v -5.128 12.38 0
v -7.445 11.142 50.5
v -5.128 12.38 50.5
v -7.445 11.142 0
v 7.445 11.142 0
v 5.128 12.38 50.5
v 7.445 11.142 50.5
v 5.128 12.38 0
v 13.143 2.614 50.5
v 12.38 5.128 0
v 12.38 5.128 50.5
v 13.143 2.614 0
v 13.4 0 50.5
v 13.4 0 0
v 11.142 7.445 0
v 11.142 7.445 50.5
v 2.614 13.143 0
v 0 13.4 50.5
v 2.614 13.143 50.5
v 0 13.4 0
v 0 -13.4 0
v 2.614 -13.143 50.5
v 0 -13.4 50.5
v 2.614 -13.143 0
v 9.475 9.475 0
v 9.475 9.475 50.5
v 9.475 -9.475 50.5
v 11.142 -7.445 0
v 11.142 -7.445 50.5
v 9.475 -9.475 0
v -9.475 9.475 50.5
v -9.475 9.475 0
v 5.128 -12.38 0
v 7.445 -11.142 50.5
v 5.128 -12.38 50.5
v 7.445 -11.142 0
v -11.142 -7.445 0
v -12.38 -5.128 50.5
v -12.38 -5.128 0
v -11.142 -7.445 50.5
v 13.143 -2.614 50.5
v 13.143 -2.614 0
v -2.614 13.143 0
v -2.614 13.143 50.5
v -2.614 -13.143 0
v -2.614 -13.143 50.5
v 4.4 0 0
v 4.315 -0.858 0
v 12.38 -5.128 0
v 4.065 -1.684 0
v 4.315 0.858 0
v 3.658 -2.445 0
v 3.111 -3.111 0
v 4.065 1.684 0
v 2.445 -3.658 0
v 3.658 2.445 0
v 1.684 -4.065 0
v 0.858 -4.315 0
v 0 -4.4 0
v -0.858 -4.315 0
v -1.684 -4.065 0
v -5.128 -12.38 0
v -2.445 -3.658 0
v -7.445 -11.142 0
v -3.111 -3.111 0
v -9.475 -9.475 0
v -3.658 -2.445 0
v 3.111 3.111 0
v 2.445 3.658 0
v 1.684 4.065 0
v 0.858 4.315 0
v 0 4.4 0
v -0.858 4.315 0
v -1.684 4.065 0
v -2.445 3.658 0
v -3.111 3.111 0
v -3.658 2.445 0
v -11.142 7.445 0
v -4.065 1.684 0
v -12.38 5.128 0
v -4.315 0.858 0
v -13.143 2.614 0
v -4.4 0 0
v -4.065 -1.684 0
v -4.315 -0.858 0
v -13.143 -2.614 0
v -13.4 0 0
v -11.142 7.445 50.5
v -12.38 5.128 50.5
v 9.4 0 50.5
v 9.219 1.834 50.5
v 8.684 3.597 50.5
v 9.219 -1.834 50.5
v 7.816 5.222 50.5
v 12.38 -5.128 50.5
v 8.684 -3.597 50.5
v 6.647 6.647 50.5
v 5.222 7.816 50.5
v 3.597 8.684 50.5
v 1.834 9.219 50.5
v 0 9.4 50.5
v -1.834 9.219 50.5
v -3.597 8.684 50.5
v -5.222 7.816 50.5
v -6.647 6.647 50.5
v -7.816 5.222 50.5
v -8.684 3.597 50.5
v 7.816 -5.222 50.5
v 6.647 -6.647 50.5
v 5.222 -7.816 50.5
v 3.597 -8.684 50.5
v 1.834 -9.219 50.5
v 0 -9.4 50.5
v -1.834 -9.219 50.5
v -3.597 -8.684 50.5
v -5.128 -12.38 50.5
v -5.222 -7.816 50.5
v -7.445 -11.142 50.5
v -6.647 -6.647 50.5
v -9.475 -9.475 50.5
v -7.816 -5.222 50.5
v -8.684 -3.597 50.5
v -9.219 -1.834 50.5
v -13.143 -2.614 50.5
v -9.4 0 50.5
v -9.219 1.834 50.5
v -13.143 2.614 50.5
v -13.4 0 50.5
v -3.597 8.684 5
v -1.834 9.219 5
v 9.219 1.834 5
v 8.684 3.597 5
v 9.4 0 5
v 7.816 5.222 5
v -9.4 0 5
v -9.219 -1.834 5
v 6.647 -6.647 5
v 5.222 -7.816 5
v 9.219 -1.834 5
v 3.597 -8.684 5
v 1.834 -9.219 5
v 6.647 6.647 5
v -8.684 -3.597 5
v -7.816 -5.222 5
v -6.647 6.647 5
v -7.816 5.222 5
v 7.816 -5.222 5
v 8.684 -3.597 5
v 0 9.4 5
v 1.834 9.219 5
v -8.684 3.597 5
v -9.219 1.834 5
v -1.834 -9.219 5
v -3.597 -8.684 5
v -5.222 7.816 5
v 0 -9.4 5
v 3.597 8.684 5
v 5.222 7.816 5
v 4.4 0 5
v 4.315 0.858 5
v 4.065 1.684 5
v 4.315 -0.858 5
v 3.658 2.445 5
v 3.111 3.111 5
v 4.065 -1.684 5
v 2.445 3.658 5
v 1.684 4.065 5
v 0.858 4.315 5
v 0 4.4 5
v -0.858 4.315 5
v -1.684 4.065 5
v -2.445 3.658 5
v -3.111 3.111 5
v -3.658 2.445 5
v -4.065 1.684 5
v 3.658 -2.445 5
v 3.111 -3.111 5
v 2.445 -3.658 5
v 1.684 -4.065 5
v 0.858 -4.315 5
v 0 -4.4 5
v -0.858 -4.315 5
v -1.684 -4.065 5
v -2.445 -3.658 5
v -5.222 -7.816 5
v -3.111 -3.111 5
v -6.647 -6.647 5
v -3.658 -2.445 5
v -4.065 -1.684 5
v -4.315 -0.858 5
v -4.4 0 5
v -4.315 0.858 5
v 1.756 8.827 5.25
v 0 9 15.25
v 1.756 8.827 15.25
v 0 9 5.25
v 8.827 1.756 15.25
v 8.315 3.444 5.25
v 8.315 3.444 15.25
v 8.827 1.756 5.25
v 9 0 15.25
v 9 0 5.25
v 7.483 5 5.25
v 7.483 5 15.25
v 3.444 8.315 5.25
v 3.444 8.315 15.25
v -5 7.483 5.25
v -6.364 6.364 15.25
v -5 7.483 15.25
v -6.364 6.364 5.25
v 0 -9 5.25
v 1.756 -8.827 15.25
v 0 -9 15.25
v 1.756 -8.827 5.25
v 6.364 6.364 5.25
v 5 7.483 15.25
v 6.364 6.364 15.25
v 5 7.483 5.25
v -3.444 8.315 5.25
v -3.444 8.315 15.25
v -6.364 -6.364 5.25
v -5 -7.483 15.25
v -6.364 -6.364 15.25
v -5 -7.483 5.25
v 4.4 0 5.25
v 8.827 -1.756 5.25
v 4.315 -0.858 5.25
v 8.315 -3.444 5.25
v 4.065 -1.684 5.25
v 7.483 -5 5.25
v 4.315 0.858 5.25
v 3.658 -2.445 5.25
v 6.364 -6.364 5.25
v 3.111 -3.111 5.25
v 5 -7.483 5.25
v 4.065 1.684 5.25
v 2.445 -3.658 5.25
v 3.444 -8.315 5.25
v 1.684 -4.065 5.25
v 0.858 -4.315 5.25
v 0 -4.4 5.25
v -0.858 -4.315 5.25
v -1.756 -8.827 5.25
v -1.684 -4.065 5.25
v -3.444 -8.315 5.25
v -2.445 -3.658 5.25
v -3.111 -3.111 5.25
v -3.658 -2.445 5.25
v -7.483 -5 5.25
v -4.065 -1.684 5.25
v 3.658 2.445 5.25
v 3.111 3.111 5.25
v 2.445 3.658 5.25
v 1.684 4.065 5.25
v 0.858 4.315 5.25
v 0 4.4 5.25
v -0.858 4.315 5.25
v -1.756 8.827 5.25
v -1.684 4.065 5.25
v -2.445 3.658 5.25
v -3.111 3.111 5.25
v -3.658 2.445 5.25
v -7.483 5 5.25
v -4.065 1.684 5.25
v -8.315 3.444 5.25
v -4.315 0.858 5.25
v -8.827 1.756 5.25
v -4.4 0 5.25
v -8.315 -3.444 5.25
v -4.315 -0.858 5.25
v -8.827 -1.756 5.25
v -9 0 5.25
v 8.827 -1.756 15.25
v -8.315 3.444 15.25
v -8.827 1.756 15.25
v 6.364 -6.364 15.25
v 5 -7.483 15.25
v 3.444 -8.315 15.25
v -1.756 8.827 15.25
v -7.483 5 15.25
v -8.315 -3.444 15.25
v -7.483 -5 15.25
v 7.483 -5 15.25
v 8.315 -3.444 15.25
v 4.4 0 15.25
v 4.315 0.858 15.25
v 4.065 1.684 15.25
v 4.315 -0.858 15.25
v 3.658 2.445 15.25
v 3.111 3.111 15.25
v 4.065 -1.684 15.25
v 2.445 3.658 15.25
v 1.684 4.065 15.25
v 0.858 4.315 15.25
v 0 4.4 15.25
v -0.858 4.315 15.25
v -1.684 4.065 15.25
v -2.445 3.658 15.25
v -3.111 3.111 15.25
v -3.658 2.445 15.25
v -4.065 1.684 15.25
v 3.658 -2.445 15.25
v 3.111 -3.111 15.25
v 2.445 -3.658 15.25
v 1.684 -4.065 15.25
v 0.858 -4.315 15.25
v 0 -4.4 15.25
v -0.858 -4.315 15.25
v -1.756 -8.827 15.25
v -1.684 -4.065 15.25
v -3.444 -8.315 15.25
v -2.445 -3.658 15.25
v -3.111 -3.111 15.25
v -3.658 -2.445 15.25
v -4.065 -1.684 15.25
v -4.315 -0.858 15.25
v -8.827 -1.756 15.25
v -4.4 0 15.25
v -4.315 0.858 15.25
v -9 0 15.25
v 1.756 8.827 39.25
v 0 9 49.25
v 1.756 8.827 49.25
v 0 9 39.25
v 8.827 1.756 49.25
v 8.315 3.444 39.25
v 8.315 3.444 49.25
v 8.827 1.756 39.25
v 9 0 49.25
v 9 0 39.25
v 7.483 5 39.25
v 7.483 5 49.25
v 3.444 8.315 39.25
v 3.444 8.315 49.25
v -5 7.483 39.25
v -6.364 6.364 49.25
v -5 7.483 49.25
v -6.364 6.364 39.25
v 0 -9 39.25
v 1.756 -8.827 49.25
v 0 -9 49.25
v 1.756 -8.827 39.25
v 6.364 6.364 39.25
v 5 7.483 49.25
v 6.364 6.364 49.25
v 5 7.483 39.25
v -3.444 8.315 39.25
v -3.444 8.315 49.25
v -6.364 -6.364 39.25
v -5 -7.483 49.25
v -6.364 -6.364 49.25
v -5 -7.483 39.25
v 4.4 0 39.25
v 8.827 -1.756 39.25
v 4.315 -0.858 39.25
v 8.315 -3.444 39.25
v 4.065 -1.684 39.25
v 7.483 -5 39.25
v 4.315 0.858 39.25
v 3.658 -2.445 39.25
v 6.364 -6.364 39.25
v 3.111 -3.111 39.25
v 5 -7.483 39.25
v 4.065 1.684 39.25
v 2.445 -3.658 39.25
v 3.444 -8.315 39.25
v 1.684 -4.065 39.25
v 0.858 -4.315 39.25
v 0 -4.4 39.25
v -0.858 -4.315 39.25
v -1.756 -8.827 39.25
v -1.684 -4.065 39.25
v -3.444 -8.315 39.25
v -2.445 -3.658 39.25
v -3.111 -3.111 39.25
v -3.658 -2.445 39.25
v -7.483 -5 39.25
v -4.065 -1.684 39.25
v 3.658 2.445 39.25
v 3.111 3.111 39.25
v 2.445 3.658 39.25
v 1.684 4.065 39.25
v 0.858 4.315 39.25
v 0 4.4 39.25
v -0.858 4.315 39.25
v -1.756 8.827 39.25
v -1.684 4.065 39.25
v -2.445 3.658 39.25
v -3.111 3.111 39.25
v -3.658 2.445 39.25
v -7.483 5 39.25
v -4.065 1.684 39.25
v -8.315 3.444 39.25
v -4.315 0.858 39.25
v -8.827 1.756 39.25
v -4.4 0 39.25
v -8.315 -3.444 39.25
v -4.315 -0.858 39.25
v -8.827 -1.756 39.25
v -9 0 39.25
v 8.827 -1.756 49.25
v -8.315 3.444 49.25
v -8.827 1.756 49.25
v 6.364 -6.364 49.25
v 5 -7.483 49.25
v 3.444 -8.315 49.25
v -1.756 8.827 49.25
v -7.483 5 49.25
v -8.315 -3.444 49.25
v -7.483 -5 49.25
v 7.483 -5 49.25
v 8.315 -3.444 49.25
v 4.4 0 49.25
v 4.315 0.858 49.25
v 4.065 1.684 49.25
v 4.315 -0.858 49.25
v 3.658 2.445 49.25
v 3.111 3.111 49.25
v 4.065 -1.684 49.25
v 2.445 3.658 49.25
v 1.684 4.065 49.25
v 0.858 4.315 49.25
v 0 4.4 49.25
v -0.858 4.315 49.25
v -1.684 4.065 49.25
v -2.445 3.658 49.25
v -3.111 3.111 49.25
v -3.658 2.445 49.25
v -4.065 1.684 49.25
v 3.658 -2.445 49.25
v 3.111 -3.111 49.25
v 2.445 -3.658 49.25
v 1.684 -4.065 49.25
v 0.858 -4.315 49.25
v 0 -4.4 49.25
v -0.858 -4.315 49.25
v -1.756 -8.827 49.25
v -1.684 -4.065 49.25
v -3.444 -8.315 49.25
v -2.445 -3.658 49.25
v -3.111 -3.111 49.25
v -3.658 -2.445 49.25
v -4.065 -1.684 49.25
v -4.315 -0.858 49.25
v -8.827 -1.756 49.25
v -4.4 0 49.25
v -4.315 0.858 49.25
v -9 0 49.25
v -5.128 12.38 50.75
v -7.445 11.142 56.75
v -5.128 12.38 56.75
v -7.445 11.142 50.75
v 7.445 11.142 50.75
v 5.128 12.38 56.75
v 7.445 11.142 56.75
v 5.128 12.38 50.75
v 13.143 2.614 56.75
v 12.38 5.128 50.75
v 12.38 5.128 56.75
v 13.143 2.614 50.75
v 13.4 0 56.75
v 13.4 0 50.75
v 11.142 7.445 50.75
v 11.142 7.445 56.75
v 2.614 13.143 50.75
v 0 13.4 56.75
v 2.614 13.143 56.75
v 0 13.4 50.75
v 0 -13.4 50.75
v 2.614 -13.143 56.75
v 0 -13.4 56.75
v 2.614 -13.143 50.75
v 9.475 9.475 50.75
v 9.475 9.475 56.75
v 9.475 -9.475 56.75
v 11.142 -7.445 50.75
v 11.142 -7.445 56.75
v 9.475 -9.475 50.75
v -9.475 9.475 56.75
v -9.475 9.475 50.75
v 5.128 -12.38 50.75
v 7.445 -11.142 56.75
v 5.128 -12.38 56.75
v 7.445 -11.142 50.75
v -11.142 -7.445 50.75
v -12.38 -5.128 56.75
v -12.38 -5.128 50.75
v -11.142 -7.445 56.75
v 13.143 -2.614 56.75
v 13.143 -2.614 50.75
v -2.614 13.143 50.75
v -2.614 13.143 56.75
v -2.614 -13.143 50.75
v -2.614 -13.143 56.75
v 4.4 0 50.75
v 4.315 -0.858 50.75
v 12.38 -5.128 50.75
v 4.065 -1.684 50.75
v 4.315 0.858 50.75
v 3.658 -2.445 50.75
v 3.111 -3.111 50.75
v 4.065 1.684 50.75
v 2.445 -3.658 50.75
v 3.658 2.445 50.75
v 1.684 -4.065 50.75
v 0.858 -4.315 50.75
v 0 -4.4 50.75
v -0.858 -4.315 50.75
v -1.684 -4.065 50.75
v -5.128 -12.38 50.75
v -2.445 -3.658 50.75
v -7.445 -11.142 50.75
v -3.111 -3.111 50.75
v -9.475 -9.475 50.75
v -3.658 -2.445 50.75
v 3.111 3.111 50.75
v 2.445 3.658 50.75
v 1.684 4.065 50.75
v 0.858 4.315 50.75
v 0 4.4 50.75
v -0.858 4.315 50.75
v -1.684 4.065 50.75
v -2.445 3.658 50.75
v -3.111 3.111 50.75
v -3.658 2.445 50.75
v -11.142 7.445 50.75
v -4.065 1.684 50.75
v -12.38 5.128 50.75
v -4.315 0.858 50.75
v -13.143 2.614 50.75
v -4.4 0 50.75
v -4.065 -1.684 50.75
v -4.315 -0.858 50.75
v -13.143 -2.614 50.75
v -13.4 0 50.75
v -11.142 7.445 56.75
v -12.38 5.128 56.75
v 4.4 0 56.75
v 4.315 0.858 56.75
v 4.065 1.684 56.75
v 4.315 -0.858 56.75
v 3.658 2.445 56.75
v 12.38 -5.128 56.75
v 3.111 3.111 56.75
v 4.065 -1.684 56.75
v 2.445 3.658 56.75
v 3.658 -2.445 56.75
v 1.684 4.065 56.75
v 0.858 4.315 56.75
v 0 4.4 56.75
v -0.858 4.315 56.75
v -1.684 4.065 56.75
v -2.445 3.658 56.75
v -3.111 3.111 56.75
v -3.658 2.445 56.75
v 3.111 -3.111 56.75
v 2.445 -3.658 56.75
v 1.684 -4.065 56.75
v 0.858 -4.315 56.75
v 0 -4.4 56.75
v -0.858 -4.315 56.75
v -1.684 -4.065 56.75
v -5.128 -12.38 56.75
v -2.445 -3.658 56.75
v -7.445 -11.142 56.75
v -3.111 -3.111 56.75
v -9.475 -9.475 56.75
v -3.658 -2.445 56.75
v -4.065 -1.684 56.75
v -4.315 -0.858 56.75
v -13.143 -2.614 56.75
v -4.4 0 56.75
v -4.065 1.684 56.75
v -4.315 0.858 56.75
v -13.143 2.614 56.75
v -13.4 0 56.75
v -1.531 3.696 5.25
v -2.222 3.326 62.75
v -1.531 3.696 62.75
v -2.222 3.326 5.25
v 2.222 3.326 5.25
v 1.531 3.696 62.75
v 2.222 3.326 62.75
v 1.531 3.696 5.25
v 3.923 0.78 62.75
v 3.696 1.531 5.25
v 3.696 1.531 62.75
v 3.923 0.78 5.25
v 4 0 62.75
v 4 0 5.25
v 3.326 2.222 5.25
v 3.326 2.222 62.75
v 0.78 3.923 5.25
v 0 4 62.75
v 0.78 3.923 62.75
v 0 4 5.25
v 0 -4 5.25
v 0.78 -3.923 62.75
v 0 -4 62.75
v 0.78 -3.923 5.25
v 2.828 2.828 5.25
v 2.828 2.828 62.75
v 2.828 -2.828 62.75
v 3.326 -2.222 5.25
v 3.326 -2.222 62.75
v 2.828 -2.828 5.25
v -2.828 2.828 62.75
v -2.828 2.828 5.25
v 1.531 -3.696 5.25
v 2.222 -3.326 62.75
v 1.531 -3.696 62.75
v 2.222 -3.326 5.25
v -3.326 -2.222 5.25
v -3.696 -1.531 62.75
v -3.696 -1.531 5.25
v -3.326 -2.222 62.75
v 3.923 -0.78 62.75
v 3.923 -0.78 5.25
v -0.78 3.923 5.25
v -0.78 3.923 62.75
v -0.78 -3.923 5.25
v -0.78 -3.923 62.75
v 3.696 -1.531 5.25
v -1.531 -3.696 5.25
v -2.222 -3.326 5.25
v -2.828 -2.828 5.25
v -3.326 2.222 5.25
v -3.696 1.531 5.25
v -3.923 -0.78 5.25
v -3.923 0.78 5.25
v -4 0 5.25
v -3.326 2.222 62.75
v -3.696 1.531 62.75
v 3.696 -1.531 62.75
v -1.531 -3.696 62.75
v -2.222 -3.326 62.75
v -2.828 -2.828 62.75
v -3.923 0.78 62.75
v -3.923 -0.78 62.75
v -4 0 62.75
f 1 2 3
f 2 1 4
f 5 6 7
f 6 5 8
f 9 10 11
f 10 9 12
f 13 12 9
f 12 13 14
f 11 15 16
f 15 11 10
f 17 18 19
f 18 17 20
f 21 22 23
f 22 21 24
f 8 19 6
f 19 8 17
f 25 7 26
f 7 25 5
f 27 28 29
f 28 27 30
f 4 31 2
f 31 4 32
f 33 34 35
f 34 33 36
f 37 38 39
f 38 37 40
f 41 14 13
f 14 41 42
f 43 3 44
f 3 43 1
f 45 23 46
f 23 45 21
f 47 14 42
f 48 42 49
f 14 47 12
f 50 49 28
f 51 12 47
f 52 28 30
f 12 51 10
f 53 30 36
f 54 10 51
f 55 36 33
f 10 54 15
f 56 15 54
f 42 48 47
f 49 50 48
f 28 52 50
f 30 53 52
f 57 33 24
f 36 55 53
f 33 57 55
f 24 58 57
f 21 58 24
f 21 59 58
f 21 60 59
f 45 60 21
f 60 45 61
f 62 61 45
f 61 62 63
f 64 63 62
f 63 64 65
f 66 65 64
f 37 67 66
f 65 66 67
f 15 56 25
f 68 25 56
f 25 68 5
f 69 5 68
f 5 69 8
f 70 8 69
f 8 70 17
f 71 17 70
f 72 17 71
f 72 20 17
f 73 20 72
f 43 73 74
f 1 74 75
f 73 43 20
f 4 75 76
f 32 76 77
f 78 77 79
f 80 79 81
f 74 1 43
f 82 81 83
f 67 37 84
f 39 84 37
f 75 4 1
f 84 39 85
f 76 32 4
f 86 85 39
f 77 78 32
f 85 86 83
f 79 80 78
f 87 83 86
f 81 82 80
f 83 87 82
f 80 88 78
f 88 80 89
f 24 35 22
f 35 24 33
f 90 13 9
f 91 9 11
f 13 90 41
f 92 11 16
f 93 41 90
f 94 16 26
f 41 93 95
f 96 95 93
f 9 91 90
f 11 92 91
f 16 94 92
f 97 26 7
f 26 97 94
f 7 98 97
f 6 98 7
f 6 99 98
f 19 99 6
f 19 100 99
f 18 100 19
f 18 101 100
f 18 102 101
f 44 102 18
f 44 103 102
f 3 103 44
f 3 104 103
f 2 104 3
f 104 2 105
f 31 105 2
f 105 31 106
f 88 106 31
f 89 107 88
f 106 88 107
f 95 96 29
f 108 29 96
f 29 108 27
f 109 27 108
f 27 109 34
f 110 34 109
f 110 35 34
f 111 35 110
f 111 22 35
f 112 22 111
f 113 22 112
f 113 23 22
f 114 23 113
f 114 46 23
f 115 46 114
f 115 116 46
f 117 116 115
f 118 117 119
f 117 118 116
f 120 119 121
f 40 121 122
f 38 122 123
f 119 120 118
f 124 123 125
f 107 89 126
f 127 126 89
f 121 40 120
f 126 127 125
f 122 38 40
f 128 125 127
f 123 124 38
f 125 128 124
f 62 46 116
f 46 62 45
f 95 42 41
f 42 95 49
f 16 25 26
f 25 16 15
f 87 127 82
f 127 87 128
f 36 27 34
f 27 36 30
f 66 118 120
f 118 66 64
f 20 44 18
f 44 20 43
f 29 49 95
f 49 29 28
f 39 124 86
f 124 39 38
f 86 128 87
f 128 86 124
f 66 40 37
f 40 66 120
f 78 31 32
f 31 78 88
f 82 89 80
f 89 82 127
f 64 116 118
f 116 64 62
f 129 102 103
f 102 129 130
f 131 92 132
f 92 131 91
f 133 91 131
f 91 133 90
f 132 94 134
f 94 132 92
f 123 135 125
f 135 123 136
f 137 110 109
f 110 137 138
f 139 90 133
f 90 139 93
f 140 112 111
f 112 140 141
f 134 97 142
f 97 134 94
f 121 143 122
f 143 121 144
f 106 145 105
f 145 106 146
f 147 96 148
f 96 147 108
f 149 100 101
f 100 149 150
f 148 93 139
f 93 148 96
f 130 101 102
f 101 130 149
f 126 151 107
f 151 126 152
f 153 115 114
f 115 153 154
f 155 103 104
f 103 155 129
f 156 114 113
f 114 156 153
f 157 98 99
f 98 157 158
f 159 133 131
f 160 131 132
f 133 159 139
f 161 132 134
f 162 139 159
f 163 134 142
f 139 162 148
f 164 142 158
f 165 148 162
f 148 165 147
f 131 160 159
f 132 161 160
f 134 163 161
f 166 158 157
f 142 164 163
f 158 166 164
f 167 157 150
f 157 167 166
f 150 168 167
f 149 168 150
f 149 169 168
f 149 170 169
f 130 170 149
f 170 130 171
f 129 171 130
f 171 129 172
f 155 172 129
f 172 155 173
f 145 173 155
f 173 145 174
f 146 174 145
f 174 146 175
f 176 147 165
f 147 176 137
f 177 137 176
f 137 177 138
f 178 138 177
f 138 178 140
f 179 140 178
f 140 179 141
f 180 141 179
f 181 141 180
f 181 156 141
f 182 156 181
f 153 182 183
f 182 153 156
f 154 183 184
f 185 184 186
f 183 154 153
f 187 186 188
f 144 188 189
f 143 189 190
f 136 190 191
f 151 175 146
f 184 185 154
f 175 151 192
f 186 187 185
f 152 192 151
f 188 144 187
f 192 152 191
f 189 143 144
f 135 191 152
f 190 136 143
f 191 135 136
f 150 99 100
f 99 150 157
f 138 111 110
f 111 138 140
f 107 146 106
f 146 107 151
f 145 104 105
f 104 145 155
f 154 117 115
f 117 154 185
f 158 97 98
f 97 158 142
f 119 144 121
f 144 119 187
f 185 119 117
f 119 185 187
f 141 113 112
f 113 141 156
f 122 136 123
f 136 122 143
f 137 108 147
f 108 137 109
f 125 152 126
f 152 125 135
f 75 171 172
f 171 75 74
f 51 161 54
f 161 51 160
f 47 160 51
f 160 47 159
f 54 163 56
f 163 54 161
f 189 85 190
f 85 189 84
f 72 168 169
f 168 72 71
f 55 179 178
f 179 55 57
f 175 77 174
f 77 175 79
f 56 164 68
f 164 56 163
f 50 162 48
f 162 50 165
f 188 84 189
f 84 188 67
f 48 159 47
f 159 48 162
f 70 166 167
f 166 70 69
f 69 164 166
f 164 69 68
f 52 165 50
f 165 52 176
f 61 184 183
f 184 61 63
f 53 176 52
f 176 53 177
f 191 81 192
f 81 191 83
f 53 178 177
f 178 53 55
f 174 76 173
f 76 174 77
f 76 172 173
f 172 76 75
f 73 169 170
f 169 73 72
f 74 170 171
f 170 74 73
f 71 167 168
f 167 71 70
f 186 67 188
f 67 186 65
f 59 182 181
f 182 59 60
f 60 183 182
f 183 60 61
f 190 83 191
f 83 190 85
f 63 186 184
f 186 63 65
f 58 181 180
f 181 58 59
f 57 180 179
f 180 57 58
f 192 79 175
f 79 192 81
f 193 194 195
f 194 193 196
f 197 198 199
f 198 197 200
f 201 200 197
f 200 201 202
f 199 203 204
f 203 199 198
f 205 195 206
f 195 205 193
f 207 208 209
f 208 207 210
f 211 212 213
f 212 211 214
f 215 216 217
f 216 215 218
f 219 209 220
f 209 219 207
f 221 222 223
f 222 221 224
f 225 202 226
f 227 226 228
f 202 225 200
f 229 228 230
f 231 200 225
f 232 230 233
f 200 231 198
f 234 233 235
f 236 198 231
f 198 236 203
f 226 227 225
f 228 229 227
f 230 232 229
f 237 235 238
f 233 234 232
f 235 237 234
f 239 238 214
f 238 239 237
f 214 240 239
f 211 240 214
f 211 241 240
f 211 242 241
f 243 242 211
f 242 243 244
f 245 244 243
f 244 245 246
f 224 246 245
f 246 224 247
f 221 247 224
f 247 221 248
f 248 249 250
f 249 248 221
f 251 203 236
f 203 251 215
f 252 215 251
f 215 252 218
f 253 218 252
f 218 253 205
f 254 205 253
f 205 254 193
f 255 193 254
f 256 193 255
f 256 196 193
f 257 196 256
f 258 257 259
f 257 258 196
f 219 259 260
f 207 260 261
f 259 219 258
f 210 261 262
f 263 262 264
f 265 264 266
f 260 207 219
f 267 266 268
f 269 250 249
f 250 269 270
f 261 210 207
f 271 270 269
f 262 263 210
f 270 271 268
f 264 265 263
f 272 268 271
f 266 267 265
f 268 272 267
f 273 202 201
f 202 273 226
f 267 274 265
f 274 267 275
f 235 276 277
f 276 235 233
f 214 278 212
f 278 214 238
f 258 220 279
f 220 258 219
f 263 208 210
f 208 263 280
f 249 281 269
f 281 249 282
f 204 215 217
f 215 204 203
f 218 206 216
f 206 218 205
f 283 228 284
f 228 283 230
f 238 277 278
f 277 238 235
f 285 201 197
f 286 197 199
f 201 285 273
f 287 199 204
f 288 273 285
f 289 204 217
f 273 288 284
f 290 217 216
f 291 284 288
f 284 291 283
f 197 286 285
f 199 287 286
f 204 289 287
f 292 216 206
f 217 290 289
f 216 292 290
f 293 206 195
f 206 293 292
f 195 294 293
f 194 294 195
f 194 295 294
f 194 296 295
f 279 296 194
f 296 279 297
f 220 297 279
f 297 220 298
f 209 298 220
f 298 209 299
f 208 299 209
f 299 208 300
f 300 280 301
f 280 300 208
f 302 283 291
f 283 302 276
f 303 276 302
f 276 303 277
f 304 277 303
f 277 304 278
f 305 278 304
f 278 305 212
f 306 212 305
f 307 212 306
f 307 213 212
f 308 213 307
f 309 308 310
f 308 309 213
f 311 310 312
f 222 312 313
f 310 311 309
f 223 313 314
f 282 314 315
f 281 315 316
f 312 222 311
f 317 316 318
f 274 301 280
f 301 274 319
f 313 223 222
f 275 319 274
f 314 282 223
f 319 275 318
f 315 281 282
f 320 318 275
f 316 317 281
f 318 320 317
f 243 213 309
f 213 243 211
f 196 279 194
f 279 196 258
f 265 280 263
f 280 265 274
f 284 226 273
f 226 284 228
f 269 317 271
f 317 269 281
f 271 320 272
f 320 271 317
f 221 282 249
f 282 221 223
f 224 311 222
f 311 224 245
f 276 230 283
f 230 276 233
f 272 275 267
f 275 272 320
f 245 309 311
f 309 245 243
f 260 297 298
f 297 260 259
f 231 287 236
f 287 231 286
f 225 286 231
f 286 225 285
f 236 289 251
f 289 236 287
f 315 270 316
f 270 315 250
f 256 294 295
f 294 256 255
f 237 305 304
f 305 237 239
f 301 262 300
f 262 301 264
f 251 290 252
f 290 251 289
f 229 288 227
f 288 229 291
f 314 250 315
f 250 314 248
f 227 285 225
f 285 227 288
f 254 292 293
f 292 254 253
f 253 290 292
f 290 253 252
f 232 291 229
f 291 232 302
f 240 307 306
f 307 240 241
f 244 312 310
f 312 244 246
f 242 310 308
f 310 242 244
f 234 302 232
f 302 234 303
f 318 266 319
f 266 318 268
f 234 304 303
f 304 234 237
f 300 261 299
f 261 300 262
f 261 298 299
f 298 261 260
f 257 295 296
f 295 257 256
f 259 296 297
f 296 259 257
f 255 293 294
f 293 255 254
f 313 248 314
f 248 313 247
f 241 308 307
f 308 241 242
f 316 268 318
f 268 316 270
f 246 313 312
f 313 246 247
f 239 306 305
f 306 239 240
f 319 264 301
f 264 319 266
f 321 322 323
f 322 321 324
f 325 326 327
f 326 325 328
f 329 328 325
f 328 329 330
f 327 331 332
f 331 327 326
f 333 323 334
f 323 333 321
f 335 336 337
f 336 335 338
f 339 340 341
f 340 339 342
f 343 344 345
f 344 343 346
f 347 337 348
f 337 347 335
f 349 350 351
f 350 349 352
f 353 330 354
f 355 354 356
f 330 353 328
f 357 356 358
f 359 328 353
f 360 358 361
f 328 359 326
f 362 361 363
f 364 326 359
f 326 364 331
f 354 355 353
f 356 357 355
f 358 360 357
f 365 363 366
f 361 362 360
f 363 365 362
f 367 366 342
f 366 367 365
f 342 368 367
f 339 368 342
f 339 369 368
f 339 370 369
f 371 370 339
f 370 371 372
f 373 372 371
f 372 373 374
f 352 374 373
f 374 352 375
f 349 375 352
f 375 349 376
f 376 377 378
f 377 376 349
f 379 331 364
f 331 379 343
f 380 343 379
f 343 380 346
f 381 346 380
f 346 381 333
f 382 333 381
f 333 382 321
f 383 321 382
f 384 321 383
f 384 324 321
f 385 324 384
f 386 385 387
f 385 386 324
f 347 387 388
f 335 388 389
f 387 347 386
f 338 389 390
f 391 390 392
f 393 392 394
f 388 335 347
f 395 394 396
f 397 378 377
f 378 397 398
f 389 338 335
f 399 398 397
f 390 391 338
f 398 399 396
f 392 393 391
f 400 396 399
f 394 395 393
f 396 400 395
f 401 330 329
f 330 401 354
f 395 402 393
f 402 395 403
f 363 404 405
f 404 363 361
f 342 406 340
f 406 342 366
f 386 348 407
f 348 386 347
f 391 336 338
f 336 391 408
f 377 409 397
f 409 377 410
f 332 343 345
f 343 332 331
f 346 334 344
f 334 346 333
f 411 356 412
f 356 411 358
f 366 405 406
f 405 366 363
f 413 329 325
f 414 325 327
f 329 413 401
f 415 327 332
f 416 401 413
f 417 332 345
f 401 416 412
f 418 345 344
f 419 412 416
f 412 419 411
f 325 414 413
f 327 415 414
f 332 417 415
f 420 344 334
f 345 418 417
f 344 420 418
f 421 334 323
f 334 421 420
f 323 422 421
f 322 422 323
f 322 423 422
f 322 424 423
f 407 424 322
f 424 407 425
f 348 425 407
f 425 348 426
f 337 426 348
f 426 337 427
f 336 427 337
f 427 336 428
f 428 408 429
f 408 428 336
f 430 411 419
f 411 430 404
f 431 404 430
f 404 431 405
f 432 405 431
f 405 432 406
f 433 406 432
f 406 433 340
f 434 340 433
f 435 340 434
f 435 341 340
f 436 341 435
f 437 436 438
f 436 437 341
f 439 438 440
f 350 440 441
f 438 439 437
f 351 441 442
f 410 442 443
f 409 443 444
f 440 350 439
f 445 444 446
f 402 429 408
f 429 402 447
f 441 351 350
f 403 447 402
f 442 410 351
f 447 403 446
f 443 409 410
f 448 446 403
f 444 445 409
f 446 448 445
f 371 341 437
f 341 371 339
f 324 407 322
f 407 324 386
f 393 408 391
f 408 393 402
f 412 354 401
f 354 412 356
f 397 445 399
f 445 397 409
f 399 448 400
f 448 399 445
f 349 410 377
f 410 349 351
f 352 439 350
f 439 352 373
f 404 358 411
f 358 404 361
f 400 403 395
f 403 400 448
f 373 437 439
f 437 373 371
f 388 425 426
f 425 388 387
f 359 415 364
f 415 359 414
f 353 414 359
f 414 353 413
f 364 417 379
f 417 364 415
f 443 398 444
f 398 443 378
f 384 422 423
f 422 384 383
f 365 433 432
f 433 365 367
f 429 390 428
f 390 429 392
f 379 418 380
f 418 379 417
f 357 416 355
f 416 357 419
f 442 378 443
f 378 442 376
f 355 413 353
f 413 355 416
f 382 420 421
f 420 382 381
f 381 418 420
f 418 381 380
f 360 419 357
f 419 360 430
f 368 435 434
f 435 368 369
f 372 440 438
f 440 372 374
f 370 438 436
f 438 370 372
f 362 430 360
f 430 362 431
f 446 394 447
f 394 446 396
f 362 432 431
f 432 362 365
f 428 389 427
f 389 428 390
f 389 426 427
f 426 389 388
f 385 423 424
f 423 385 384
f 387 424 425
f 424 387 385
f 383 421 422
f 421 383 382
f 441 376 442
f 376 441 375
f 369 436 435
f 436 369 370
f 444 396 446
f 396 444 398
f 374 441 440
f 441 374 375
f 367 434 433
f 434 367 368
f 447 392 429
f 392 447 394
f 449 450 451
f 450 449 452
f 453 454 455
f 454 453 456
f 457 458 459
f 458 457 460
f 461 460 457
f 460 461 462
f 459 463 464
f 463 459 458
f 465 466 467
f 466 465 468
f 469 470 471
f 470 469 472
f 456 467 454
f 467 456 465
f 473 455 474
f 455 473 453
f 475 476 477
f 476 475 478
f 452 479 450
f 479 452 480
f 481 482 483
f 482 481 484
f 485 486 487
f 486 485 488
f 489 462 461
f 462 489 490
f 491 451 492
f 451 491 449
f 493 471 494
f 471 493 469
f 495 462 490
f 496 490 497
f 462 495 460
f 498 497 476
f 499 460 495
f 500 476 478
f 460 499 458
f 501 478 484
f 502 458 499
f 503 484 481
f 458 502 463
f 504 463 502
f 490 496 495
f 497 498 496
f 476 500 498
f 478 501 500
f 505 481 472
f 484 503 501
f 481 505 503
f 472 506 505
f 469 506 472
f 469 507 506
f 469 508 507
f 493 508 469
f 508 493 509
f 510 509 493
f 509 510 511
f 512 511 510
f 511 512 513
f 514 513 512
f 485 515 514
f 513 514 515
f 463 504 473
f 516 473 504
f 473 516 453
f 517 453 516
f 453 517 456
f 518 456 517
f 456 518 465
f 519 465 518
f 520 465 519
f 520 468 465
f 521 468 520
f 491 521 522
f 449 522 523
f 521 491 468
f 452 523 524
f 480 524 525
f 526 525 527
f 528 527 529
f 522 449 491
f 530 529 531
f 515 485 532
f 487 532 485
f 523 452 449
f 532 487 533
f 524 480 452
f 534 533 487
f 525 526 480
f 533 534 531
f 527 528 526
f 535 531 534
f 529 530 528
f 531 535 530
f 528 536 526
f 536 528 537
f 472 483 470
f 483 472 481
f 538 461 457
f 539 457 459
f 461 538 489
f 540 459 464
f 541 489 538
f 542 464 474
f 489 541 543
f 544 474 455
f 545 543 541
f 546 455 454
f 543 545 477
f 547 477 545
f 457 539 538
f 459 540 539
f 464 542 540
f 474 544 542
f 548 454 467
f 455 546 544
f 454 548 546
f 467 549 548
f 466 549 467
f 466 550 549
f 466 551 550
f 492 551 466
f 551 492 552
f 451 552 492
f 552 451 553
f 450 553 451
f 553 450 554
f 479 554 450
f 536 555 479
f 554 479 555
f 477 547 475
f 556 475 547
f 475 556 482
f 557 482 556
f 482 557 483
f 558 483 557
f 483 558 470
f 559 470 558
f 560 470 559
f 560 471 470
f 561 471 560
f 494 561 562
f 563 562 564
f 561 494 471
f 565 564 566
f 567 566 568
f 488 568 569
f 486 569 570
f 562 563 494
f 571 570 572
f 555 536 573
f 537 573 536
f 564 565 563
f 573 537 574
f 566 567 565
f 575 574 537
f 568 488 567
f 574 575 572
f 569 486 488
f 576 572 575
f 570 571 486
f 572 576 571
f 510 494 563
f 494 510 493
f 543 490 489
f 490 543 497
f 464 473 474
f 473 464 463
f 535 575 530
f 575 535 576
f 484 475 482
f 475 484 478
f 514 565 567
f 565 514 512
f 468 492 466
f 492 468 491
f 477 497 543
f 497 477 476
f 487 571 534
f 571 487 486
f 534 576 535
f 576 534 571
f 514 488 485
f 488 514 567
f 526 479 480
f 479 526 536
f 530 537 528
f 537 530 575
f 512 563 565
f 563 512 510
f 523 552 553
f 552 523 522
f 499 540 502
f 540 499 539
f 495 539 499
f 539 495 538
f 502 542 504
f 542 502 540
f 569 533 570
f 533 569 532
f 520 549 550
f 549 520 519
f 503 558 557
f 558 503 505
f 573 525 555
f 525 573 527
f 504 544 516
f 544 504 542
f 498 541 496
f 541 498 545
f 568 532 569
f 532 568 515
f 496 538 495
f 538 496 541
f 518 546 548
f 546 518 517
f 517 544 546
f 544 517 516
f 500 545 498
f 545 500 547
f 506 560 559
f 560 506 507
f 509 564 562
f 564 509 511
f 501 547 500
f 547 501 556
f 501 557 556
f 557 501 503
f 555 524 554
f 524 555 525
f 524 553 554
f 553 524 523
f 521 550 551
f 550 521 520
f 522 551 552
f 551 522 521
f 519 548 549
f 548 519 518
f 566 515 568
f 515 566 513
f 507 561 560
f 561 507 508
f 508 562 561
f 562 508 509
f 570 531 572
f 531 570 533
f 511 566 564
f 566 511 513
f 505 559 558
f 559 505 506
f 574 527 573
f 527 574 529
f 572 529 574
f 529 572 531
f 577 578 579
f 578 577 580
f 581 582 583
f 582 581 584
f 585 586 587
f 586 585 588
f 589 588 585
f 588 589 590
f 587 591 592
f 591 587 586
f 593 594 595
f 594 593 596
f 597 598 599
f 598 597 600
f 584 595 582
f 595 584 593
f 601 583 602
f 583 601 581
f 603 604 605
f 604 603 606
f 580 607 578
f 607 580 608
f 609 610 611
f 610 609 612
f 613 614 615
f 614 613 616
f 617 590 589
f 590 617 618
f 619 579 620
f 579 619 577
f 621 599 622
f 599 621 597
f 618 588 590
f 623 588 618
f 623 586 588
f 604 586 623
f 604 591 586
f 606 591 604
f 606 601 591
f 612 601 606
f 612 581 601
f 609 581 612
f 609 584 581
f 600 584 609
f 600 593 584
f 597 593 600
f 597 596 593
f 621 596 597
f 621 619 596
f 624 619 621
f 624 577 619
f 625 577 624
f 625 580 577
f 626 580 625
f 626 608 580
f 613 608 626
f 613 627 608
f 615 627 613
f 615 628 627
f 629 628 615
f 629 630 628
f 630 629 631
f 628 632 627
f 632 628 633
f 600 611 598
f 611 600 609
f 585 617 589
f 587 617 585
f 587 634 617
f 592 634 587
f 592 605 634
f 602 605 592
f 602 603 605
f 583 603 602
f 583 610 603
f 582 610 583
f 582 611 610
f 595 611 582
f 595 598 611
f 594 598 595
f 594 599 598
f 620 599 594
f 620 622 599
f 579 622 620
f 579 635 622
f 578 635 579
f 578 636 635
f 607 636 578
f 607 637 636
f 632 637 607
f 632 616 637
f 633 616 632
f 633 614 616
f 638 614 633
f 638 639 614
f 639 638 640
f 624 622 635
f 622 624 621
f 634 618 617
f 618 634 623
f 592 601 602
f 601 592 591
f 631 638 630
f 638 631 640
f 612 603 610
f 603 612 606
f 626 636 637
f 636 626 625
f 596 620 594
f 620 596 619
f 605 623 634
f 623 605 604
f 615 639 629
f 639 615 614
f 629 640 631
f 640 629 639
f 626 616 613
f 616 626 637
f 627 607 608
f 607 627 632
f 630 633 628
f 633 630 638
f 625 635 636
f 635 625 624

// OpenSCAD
$fn = 32;

// ------------------------------------------------------------------------
// Shaft station: cup d26.8 x 50.5 mm, shaft d8
// Every part is its own module, assembly() places every instance.
// ------------------------------------------------------------------------

// --- part 1 ---
module housing_cup() {
  difference() {
    cylinder(h = 50.5, d = 26.8);
    translate([0, 0, 5]) cylinder(h = 46.5, d = 18.8);
    translate([0, 0, -1]) cylinder(h = 7, d = 8.8);
  }
}

// --- part 2 ---
module bearing_lower() {
  difference() {
      translate([0, 0, 0]) cylinder(h = 10, d = 18);
      translate([0, 0, -1]) cylinder(h = 12, d = 8.8);
    }
}

// --- part 3 ---
module bearing_upper() {
  difference() {
      translate([0, 0, 0]) cylinder(h = 10, d = 18);
      translate([0, 0, -1]) cylinder(h = 12, d = 8.8);
    }
}

// --- part 4 ---
module station_shaft() {
  translate([0, 0, -28.75]) cylinder(h = 57.5, d = 8);
}

// --- part 5 ---
module station_cover() {
  difference() {
    cylinder(h = 6, d = 26.8);
    translate([0, 0, -1]) cylinder(h = 8, d = 8.8);
  }
}

// --- assembly ---
module assembly() {
  color([0.80, 0.24, 0.20]) translate([0, 0, 0]) rotate([0, 0, 0]) housing_cup();
  color([0.20, 0.45, 0.75]) translate([0, 0, 5.25]) rotate([0, 0, 0]) bearing_lower();
  color([0.25, 0.62, 0.32]) translate([0, 0, 39.25]) rotate([0, 0, 0]) bearing_upper();
  color([0.92, 0.70, 0.18]) translate([0, 0, 34]) rotate([0, 0, 0]) station_shaft();
  color([0.58, 0.35, 0.70]) translate([0, 0, 50.75]) rotate([0, 0, 0]) station_cover();
}

assembly();
